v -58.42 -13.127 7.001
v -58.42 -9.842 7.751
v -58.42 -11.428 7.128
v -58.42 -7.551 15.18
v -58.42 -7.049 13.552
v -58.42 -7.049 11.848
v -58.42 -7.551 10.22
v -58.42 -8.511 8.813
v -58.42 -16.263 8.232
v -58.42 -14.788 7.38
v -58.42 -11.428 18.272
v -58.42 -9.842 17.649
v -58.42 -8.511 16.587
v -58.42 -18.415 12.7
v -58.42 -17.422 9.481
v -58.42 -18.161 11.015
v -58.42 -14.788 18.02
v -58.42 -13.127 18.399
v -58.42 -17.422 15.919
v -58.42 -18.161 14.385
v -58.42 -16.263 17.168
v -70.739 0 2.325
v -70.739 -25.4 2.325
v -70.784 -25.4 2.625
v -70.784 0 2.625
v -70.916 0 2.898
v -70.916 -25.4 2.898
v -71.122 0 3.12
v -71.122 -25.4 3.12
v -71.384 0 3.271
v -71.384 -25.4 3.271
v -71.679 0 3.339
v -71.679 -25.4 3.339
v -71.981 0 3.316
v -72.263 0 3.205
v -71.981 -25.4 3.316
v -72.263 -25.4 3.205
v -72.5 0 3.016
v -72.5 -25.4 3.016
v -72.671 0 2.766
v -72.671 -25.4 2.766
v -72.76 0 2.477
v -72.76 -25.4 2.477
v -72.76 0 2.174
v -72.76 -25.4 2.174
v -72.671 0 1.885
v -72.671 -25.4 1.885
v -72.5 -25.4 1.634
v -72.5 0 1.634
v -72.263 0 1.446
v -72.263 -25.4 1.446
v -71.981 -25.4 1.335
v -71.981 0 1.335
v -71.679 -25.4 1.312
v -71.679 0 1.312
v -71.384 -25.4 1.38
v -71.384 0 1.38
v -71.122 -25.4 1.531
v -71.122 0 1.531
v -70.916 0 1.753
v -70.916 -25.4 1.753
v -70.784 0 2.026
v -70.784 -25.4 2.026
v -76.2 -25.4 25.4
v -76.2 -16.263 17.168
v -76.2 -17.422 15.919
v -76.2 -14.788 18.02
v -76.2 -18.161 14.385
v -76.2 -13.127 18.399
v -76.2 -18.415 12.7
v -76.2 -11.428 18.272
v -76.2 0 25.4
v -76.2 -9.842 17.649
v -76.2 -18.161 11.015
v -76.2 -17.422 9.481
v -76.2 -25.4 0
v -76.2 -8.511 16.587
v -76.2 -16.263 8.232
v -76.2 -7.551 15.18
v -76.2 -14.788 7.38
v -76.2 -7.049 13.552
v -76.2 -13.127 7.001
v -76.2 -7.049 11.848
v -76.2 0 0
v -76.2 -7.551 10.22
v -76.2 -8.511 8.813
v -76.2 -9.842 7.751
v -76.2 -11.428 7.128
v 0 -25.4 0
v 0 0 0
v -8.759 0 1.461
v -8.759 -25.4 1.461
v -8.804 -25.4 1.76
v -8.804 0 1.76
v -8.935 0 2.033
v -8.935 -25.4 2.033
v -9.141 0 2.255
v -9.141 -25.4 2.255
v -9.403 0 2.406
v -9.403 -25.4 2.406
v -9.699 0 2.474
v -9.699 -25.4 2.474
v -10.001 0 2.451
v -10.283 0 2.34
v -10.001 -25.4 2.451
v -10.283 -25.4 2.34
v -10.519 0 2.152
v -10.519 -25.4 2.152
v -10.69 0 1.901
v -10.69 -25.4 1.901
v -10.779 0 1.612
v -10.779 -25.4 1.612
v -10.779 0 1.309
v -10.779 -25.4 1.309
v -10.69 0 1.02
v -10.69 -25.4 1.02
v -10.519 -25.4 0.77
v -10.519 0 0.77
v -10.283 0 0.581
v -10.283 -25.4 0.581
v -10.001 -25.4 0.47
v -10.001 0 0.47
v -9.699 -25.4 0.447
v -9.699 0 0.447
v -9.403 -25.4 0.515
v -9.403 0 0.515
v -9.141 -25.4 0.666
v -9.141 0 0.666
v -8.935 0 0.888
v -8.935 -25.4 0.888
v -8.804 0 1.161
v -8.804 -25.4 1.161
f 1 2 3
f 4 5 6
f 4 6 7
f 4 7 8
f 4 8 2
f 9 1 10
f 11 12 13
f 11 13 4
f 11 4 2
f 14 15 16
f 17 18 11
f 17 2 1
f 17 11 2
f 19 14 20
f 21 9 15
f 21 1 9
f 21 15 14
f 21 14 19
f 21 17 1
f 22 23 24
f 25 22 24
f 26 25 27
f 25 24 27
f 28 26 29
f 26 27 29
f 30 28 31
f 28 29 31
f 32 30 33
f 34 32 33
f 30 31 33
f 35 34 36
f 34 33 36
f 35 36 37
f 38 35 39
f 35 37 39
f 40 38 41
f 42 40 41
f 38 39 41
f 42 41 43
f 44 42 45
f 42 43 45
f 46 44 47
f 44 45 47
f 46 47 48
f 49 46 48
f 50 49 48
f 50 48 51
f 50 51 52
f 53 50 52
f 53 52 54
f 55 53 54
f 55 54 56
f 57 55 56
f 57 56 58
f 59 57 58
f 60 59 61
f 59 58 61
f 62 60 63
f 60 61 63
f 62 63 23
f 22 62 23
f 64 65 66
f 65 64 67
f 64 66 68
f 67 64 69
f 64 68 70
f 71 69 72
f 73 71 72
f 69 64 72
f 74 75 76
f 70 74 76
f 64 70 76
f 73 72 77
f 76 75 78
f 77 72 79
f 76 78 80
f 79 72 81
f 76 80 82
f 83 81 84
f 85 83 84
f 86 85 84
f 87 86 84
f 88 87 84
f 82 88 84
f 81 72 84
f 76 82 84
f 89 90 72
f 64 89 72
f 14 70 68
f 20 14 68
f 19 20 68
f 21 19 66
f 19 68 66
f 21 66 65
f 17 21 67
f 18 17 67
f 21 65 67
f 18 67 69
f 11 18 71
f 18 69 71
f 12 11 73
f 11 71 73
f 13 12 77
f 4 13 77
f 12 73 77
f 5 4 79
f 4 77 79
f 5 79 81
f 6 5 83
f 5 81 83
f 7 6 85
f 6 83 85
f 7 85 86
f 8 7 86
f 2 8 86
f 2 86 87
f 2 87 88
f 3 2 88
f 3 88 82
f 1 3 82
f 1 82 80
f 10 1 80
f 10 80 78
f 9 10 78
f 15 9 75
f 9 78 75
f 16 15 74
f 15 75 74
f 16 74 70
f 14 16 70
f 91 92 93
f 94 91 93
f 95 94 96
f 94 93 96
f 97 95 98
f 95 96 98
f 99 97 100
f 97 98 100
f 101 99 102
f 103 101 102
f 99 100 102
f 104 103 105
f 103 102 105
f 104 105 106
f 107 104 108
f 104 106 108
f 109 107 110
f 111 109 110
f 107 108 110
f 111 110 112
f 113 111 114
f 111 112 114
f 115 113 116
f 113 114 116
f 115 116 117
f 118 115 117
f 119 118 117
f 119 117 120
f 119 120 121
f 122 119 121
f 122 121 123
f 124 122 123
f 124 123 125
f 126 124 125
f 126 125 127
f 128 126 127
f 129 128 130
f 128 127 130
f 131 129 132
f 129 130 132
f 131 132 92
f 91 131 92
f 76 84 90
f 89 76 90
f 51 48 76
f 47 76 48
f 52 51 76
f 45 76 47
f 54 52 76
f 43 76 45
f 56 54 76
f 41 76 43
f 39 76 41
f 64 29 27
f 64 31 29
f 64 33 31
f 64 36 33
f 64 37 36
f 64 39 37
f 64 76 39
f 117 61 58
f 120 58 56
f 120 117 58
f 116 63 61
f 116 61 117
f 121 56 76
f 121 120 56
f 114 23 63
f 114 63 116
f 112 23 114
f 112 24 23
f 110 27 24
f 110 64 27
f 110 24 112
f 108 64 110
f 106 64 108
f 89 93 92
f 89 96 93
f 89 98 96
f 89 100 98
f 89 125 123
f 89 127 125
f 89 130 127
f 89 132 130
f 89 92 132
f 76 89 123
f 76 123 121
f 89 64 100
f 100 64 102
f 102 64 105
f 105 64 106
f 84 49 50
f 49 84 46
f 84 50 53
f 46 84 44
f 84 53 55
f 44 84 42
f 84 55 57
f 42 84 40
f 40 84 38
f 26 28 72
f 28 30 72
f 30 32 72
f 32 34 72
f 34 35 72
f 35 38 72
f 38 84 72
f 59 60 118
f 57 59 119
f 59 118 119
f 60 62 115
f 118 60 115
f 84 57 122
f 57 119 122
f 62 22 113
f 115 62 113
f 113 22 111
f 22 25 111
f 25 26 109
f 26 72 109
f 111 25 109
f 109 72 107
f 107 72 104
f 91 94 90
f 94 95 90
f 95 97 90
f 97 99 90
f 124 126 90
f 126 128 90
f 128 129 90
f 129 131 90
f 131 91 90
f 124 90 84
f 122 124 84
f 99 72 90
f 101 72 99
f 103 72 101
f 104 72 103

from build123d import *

# Parameters (mm, degrees)
F1_DEPTH = 25.4
F2_R     = 5.715
F3_DEPTH = 17.78
F4_R     = 1.016
F5_DEPTH = 25.4
F6_R     = 1.016
F7_DEPTH = 25.4


with BuildPart() as f1:
    # F0 (on Front) → F1 (new body)
    with BuildSketch(Plane.XZ):
        Polygon((-76.2, 0), (0, 0), (-76.2, 25.4), align=None)
    extrude(amount=F1_DEPTH)

    # F2 (on face) → F3 (cut)
    with BuildSketch(Plane(origin=(-76.2, 0, 0), x_dir=(0, -1, 0), z_dir=(-1, 0, 0))):
        with Locations((12.7, 12.7)):
            Circle(F2_R)
    extrude(amount=-F3_DEPTH, mode=Mode.SUBTRACT)

    # F4 (on face) → F5 (cut)
    with BuildSketch(Plane.XZ.offset(25.4)):
        with Locations((-71.755275, 2.325441)):
            Circle(F4_R)
    extrude(amount=-F5_DEPTH, mode=Mode.SUBTRACT)

    # F6 (on face) → F7 (cut)
    with BuildSketch(Plane.XZ.offset(25.4)):
        with Locations((-9.774557, 1.460582)):
            Circle(F6_R)
    extrude(amount=-F7_DEPTH, mode=Mode.SUBTRACT)


solid = f1.part
